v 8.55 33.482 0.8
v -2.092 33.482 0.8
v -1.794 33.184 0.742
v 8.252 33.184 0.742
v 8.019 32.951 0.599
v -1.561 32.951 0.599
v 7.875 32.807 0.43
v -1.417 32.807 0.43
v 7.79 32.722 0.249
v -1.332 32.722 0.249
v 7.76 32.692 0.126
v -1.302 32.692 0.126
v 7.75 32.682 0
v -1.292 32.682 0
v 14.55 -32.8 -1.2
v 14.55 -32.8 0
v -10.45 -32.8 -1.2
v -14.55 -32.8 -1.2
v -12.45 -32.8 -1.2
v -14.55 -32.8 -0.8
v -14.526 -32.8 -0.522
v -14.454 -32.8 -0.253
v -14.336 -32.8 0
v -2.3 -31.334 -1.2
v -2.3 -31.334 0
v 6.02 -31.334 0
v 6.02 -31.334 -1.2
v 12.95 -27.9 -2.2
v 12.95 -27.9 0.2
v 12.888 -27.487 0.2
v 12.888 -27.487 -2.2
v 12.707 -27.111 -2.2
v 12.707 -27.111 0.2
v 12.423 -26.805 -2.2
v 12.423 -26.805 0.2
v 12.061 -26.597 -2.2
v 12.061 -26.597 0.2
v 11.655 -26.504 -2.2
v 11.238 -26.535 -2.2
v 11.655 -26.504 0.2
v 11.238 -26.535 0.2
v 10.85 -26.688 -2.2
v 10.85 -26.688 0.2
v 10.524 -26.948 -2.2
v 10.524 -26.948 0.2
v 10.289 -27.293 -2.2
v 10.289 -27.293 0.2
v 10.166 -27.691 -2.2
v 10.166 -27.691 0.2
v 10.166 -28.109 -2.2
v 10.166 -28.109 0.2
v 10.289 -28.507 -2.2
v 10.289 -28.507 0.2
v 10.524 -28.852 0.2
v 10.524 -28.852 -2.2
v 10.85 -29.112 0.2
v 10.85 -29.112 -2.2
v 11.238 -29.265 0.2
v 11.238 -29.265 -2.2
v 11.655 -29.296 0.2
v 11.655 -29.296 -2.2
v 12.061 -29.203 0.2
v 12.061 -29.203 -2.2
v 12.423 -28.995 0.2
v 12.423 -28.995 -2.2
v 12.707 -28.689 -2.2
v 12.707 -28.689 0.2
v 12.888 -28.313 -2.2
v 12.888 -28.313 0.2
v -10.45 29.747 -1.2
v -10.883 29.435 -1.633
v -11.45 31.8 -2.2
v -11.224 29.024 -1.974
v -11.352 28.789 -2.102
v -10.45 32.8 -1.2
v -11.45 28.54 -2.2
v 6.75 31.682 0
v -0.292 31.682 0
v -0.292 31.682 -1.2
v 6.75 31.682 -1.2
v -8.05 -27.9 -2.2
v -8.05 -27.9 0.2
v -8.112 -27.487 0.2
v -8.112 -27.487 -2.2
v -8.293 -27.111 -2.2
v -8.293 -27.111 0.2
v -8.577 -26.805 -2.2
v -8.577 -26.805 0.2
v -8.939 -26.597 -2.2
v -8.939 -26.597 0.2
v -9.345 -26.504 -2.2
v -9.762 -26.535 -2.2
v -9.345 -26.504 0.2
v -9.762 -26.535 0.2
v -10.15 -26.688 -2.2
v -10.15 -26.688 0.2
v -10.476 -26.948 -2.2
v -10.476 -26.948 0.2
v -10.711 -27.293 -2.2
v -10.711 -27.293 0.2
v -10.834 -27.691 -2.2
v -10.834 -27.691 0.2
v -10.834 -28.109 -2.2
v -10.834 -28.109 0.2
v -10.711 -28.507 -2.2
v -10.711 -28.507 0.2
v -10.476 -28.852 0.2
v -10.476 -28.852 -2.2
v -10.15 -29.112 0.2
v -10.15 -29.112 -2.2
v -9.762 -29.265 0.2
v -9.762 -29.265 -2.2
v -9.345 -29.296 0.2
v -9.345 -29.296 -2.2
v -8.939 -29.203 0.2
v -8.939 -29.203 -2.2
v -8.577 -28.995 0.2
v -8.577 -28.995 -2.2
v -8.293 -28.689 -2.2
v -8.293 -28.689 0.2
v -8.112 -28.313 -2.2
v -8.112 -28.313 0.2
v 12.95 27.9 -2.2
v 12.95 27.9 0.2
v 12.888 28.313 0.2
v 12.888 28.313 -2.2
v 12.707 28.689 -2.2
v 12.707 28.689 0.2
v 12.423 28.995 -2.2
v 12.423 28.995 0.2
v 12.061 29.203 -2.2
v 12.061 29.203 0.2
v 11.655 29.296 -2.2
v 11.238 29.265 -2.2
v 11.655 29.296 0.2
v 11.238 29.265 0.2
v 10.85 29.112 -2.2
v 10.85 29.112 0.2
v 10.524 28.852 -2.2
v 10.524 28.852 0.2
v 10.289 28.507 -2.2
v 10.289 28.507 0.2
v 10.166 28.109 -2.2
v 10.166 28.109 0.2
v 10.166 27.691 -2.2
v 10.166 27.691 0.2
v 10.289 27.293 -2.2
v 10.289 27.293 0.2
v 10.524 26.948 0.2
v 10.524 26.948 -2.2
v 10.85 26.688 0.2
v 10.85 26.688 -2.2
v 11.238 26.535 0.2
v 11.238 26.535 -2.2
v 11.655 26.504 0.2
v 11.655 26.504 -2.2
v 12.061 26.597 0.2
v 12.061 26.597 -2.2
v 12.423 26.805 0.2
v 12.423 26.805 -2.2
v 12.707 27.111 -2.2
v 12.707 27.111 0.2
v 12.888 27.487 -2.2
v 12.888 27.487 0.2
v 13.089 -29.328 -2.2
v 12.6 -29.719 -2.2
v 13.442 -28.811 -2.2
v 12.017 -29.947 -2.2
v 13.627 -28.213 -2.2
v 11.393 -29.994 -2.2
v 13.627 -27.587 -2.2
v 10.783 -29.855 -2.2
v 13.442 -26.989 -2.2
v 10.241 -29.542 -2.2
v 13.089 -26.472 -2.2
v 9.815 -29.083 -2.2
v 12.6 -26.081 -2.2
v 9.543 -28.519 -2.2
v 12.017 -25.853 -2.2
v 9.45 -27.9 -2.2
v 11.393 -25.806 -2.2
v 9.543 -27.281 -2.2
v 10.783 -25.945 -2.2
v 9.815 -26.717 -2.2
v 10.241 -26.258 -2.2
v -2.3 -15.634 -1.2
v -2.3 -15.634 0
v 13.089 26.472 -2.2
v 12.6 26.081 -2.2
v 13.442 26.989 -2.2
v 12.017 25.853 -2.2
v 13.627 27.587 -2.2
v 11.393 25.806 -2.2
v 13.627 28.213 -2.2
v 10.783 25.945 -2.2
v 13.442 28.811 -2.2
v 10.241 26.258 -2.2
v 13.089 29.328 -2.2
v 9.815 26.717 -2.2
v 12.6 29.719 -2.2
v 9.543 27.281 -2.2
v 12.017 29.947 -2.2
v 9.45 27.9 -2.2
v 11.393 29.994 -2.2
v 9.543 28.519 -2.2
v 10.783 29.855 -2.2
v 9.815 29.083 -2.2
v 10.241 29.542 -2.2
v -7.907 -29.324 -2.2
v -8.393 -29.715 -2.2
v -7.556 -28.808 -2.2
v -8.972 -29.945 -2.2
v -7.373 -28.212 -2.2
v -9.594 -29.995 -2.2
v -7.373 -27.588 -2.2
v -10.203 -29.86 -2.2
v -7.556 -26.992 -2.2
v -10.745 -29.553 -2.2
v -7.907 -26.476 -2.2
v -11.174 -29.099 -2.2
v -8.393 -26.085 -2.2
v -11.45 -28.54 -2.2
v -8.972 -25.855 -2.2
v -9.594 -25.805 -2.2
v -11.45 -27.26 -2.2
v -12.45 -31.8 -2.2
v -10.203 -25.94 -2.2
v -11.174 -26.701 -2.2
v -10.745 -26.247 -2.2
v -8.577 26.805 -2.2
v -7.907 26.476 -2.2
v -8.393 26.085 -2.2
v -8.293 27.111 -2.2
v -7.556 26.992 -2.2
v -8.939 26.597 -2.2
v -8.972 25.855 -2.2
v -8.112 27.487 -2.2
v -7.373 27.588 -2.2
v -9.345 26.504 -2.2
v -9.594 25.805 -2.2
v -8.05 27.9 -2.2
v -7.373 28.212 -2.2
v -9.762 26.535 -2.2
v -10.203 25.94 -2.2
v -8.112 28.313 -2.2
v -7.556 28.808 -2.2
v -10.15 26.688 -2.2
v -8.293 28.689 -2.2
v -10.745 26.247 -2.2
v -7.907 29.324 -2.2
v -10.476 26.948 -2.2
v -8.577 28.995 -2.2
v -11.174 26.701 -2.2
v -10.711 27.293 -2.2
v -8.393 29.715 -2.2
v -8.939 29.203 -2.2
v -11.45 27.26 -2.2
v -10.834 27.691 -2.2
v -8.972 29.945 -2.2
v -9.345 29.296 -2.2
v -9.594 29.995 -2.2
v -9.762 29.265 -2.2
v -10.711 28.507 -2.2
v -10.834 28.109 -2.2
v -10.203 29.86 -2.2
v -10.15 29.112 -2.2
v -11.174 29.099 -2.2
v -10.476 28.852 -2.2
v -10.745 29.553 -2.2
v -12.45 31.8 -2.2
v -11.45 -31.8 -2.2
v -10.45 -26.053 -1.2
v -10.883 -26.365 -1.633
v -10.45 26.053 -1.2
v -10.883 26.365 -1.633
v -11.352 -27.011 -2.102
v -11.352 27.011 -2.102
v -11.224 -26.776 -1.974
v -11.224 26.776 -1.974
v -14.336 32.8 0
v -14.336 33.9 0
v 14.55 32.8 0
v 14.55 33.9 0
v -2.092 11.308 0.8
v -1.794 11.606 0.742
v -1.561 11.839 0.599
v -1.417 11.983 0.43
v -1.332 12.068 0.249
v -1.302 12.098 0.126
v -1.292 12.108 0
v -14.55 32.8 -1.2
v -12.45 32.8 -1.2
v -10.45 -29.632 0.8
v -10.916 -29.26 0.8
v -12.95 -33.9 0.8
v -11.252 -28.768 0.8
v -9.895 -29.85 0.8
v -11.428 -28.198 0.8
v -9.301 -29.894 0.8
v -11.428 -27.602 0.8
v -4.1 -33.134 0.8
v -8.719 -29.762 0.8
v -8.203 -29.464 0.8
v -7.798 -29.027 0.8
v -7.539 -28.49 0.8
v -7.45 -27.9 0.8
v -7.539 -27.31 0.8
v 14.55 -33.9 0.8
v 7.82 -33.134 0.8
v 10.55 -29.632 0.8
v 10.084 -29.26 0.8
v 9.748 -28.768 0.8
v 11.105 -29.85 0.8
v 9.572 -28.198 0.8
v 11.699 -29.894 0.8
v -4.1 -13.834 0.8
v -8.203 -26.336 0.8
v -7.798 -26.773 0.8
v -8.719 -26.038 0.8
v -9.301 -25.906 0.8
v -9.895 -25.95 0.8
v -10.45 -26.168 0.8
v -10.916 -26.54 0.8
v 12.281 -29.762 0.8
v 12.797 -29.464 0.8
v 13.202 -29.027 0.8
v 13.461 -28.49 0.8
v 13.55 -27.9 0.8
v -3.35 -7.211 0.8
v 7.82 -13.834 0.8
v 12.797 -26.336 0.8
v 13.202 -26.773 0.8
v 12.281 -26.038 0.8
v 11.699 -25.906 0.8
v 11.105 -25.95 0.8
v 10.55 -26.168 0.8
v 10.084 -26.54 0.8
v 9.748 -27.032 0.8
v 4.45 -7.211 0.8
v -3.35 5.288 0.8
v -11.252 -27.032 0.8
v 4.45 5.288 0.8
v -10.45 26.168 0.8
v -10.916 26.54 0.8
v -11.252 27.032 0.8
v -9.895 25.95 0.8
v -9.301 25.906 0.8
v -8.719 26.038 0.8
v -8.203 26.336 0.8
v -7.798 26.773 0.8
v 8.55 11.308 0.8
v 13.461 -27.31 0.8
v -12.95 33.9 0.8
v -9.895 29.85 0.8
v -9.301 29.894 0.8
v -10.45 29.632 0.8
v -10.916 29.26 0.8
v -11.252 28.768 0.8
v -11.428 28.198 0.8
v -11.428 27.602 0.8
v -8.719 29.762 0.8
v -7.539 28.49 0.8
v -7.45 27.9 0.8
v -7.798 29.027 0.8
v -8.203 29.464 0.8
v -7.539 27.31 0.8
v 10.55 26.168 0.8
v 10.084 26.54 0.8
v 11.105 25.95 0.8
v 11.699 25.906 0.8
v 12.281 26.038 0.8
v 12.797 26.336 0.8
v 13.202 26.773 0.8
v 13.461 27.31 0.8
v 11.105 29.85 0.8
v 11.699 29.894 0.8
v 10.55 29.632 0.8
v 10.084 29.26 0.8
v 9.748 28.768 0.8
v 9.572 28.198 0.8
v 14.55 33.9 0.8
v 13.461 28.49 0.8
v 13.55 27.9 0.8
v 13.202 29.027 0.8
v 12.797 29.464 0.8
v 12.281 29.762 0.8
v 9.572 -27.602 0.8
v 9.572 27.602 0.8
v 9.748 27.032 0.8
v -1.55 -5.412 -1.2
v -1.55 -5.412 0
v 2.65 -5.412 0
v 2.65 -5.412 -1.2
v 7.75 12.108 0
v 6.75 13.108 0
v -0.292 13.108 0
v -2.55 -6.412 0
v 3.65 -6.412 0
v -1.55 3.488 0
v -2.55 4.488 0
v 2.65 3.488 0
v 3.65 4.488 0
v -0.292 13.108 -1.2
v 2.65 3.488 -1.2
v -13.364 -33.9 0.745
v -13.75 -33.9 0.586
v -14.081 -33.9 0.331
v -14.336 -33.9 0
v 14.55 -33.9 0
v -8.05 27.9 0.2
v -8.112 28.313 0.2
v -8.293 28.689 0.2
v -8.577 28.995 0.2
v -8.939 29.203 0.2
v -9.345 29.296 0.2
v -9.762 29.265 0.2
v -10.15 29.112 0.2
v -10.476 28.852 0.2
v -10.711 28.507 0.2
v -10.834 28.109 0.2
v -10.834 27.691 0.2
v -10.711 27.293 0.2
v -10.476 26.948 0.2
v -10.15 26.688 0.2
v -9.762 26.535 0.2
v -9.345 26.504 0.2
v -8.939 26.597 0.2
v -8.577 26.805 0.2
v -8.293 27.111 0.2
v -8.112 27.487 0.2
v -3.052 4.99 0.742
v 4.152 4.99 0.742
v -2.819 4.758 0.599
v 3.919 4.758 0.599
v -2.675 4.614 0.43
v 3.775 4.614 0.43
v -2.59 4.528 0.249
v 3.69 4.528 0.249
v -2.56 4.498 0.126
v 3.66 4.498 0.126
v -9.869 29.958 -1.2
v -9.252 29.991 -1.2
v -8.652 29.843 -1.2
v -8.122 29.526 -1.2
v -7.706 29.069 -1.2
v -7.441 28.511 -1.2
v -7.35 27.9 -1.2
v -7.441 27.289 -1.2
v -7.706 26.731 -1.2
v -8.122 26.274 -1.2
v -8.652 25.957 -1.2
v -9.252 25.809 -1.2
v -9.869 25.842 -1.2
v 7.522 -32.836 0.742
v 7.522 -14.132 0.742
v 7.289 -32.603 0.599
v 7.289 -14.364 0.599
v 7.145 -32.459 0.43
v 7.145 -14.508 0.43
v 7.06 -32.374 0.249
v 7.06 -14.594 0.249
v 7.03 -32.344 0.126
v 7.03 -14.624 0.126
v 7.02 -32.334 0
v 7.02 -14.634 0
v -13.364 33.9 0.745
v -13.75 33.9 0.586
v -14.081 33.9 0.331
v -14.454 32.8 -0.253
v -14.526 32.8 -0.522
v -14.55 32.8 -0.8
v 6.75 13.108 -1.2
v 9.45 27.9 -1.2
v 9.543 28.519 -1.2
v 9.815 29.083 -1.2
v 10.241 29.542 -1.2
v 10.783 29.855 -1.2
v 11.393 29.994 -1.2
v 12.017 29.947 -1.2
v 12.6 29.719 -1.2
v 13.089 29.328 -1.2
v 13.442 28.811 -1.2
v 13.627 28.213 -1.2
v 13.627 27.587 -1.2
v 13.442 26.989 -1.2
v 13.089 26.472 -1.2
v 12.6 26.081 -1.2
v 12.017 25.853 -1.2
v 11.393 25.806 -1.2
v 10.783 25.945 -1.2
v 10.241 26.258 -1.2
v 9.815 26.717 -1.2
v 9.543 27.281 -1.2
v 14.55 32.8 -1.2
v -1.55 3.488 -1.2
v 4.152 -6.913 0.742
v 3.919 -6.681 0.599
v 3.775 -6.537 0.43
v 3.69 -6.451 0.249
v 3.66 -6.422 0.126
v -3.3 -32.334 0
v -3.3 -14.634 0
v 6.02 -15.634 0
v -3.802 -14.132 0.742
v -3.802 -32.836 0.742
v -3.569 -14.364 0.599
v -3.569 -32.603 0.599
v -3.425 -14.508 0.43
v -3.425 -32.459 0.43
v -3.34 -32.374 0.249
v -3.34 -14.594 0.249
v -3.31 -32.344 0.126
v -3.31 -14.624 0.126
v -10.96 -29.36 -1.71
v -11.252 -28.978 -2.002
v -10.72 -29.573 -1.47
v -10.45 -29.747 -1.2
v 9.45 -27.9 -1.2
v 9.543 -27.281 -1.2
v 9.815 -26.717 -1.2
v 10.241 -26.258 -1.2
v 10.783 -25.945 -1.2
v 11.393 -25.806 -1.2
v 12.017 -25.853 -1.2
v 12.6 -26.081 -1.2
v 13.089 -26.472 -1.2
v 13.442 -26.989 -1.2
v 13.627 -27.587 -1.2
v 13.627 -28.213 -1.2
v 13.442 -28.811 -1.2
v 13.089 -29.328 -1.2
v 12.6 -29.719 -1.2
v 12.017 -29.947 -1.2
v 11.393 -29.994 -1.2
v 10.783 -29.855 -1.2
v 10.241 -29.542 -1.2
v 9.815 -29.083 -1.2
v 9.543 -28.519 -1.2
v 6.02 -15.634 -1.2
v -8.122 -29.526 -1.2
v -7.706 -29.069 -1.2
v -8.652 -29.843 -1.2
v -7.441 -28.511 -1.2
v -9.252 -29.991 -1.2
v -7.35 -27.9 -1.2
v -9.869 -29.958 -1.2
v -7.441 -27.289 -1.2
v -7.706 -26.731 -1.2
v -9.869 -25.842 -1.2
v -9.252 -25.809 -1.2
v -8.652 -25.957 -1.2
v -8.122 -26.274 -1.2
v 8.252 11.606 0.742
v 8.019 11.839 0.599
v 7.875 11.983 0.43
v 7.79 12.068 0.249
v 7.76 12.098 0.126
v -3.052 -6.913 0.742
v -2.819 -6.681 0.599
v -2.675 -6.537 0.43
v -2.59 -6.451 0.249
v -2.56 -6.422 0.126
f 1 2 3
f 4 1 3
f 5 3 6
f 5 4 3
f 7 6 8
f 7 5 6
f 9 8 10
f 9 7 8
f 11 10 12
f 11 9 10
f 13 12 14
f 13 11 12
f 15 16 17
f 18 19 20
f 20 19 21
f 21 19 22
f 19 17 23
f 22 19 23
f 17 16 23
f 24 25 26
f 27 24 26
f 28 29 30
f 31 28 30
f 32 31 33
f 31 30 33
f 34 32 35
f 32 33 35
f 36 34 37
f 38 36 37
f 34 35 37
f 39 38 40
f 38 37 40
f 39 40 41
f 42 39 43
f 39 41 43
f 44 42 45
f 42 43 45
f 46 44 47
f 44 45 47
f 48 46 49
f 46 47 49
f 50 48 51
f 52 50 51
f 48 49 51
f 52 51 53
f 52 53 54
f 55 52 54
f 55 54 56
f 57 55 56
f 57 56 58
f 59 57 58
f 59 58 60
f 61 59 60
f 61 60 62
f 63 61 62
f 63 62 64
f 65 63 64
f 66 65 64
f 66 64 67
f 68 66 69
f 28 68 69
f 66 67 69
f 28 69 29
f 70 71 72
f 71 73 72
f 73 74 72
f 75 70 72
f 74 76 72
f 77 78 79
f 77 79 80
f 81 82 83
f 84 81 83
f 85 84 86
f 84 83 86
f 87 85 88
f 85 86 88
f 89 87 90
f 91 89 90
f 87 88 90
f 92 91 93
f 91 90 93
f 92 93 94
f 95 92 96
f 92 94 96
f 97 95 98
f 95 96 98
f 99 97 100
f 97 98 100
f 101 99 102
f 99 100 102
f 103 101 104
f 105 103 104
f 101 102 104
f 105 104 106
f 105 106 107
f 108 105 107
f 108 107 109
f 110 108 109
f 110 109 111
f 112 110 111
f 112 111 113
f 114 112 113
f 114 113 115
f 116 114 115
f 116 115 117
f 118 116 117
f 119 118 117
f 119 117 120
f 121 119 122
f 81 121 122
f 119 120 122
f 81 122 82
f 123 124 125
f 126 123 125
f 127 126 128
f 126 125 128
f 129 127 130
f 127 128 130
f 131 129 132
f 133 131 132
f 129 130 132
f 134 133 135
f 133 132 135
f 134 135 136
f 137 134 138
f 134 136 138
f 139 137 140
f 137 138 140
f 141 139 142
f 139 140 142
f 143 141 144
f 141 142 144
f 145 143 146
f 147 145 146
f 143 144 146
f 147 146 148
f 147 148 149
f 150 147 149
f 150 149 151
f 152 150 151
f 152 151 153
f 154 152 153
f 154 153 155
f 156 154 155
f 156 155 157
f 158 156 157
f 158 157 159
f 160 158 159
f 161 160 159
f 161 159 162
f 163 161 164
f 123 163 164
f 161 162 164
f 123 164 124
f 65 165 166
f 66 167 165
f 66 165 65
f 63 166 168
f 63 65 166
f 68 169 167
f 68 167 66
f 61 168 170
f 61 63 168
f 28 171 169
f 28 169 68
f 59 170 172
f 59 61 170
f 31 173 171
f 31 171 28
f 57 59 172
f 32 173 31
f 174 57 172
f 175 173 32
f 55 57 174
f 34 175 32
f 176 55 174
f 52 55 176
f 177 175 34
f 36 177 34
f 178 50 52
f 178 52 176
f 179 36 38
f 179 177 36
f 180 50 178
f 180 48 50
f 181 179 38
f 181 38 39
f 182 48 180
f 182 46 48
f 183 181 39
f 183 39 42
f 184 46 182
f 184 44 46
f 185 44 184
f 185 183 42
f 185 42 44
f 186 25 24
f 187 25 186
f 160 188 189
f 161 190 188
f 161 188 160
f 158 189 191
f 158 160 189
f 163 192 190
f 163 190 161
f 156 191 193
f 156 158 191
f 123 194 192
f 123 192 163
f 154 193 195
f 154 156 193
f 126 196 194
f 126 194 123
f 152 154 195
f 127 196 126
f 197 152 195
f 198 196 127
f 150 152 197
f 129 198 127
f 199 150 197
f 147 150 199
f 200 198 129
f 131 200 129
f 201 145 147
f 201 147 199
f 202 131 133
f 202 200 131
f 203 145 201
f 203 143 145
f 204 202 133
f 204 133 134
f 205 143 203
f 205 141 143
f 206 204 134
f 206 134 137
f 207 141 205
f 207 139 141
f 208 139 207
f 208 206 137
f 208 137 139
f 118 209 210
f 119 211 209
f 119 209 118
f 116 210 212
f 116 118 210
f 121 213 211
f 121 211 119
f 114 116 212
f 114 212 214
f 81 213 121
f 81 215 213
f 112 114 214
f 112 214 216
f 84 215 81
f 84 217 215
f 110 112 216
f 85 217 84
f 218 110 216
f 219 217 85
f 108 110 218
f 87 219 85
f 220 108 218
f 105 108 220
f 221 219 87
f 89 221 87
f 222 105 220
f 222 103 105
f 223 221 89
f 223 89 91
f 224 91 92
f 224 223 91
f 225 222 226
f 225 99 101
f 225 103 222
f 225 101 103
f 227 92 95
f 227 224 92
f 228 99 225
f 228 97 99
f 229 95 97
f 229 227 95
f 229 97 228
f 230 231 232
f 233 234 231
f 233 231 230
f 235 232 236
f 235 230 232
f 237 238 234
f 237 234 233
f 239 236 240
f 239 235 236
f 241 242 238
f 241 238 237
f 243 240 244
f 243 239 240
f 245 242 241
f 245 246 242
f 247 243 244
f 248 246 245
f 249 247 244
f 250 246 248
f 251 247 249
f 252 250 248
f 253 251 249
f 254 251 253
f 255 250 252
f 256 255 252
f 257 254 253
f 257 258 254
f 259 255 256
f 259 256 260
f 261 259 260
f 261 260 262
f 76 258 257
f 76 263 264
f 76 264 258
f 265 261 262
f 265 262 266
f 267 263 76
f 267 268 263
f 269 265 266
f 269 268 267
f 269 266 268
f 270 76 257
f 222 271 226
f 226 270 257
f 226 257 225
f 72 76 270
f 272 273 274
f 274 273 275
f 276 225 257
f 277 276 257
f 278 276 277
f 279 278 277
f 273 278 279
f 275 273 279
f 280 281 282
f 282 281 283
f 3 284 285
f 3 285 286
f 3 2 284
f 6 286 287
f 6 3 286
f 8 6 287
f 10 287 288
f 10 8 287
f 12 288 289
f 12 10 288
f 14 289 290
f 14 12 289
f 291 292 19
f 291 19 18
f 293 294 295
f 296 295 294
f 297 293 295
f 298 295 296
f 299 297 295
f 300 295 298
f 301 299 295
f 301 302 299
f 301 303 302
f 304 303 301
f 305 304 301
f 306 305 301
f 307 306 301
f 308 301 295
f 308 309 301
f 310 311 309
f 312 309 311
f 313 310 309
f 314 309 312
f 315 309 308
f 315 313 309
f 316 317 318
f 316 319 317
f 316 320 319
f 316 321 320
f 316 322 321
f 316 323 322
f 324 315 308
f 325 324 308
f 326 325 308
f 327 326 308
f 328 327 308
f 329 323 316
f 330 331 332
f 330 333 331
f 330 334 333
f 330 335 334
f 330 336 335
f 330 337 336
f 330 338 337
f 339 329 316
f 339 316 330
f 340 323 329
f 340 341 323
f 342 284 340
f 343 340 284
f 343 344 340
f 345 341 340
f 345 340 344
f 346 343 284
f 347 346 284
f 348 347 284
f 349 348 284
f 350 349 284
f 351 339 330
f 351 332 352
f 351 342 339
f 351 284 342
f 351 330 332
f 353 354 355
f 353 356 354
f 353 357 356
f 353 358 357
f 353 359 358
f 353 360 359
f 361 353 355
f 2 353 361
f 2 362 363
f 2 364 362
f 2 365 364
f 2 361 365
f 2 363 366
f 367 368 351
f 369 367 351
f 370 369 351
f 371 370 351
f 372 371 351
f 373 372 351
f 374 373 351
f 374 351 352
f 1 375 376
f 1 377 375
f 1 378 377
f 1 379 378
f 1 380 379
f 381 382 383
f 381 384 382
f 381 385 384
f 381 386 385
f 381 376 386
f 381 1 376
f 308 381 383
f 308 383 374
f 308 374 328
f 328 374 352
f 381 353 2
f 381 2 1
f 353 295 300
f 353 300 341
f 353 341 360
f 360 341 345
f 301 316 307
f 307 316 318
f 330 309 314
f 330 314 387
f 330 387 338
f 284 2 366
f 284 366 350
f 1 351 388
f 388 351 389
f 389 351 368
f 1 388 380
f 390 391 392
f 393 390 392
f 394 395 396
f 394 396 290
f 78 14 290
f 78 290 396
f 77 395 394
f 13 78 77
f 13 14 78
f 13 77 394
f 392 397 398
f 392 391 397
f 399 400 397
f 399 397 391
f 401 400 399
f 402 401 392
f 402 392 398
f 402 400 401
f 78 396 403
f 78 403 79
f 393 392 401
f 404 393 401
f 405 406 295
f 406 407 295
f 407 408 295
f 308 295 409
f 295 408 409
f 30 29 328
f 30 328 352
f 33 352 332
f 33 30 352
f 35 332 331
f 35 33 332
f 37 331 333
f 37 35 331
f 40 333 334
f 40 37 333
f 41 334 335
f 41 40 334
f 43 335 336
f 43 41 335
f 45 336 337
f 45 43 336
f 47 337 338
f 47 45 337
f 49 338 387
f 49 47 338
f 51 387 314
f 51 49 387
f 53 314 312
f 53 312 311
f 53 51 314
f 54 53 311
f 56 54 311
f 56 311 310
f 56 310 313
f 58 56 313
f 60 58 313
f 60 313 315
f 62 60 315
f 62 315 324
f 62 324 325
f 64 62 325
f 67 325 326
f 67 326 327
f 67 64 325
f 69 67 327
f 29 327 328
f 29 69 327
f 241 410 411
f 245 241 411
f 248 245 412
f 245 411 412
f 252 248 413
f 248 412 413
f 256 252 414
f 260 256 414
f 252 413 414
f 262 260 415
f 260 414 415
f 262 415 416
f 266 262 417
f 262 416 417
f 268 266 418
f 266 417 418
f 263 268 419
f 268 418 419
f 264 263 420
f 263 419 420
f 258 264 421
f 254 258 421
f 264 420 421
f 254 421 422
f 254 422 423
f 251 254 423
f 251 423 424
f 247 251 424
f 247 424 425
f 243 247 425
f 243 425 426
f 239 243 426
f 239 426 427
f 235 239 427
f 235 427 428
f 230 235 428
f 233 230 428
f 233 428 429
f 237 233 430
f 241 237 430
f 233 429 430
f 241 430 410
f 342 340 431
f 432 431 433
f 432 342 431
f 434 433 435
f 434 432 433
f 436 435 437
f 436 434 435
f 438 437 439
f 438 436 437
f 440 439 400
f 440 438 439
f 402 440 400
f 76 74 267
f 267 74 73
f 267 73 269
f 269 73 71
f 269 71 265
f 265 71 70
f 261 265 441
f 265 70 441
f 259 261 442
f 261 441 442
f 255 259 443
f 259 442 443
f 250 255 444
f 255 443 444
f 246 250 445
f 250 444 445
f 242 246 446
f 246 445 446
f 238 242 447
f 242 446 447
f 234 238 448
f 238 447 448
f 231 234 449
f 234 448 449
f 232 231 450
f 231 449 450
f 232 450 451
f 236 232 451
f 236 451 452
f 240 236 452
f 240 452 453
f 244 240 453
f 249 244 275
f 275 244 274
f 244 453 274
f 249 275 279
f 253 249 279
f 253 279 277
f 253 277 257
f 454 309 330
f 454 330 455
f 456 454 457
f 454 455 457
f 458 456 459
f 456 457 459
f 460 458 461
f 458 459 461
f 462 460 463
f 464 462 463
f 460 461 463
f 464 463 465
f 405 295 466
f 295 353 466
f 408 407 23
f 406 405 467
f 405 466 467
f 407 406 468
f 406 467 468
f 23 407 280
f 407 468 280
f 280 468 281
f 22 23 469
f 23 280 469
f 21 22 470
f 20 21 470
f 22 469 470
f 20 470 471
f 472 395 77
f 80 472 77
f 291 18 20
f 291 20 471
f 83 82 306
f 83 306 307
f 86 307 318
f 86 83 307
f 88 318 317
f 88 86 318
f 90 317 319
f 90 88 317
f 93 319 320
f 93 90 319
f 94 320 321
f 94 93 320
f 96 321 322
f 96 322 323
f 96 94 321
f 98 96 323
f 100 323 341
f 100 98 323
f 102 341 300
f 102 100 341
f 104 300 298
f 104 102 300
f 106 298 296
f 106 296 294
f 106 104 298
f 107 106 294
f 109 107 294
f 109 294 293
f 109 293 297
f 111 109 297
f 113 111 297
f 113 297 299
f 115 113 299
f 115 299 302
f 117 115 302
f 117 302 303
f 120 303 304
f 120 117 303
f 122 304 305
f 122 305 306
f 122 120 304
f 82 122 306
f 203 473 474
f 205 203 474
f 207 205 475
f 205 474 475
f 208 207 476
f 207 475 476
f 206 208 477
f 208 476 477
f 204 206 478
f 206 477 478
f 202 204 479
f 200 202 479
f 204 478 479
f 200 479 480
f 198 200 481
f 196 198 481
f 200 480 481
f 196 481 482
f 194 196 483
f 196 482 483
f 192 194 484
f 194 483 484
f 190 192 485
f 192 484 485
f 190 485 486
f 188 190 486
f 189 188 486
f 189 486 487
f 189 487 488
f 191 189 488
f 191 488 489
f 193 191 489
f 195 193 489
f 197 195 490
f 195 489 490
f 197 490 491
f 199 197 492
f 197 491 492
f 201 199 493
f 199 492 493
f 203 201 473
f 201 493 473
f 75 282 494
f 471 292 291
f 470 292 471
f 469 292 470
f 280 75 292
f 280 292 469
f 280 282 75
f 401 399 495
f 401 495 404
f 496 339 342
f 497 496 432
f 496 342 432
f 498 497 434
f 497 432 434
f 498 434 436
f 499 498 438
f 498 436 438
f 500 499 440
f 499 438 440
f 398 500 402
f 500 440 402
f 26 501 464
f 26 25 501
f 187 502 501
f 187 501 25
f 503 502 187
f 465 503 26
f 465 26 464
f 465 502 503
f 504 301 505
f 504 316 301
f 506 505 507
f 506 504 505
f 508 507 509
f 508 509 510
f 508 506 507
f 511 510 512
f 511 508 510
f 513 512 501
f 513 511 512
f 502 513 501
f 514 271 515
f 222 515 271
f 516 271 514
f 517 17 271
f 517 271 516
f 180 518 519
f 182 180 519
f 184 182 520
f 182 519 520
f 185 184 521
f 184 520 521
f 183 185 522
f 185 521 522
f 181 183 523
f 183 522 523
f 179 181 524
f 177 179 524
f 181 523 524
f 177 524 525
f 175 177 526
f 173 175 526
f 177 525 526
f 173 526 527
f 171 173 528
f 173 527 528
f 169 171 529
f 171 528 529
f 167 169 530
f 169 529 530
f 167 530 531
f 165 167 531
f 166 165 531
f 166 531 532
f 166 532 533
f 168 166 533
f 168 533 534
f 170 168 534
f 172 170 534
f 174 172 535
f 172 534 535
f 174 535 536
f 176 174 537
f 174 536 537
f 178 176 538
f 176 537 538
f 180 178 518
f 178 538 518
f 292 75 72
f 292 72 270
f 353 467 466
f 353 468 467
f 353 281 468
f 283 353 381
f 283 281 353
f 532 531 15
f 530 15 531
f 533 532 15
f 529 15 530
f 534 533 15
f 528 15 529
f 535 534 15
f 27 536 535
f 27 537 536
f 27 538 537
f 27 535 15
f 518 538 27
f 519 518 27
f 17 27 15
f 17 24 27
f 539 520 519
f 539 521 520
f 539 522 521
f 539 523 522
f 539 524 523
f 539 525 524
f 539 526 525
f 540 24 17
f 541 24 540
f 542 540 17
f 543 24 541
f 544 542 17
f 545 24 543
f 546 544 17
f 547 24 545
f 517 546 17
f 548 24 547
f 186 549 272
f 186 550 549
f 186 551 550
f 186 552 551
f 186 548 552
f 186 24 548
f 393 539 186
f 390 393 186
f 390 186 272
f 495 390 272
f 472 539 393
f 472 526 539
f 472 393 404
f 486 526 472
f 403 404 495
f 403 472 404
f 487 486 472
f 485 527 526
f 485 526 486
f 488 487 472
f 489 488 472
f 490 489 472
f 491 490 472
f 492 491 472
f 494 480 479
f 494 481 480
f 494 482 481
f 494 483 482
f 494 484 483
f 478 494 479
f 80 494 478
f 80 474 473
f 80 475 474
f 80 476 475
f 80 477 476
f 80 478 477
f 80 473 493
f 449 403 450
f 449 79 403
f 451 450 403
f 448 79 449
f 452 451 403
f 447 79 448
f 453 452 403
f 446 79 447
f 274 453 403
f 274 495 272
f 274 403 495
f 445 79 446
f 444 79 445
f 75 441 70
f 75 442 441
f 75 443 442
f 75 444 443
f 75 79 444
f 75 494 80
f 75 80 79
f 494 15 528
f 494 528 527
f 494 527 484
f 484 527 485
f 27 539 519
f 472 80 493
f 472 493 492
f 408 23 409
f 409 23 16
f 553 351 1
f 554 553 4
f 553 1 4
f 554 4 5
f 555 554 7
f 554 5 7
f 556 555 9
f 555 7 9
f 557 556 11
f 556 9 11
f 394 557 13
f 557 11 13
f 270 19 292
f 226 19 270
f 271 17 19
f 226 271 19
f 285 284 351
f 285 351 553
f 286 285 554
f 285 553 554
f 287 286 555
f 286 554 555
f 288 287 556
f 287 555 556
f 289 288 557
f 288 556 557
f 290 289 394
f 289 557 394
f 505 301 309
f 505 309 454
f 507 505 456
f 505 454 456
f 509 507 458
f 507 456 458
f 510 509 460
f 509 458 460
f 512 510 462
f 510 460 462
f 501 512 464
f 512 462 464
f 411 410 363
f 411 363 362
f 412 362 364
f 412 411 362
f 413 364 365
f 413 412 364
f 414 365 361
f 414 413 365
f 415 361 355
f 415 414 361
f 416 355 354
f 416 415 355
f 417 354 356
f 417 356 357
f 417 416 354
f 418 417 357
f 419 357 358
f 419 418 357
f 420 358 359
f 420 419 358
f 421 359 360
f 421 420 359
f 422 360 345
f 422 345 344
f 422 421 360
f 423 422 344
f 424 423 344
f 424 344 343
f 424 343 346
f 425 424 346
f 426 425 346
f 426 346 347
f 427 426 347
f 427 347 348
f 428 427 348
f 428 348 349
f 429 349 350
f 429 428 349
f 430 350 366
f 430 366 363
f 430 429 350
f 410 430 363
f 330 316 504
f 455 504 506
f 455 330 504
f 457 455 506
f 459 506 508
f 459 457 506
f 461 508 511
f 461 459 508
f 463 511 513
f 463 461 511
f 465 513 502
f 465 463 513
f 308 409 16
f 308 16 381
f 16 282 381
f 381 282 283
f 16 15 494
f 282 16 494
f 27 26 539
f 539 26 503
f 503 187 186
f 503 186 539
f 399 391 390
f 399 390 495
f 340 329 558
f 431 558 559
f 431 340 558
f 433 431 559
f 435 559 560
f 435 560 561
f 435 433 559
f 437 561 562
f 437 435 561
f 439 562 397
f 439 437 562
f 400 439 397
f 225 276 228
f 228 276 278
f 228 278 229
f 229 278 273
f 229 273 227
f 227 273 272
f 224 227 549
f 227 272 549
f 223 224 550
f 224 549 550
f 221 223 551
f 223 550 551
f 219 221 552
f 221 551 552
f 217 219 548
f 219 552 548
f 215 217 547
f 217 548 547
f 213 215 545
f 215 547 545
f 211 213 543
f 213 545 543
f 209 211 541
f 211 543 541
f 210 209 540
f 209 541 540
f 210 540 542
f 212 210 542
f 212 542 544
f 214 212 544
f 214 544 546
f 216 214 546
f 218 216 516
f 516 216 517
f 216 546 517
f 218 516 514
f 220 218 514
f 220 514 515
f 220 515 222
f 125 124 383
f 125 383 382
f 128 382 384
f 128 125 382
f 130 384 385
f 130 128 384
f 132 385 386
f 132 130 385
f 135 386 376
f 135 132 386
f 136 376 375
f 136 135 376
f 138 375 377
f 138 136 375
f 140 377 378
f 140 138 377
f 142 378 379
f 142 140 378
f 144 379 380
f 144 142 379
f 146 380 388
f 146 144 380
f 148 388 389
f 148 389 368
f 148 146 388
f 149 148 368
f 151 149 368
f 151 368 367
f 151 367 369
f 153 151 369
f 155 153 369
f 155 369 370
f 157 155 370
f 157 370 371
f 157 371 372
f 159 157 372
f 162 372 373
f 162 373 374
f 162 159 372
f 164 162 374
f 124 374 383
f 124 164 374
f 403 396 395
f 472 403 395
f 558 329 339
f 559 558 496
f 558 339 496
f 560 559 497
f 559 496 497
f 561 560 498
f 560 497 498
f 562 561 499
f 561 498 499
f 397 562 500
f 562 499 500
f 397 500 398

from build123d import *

# Parameters (mm, degrees)
SKETCH_2_W          = 29.1
SKETCH_2_H          = 67.8
EXTRUDE_1_DEPTH     = 0.8
SKETCH_3_W          = 29.1
SKETCH_3_H          = 65.6
EXTRUDE_2_DEPTH     = 1.2
SKETCH_4_R          = 1.4
SKETCH_4_W          = 7.042
SKETCH_4_H          = 18.5736
SKETCH_4_W_2        = 4.2
SKETCH_4_H_2        = 8.9
SKETCH_4_W_3        = 8.32
SKETCH_4_H_3        = 15.7
CUT_EXTRUDE_1_DEPTH = 37.944722221
SKETCH_5_R          = 2.1
SKETCH_5_R_2        = 1.1
SKETCH_5_R_3        = 1
EXTRUDE_3_DEPTH     = 1
SKETCH_6_W          = 1
SKETCH_6_H          = 65.6
EXTRUDE_4_DEPTH     = 1
CHAMFER_1_SIZE      = 1
CHAMFER_3_SIZE      = 1
SKETCH_7_W          = 9.042
SKETCH_7_H          = 20.5736
SKETCH_7_W_2        = 6.2
SKETCH_7_H_2        = 10.9
SKETCH_7_W_3        = 10.32
SKETCH_7_H_3        = 17.7
CUT_EXTRUDE_2_DEPTH = 0.8
FILLET_3_R          = 0.8
FILLET_4_R          = 0.8
FILLET_5_R          = 0.8
SKETCH_8_R          = 1.4
CUT_EXTRUDE_3_DEPTH = 37.944722221
CHAMFER_4_SIZE      = 0.6
FILLET_6_R          = 1.6


with BuildPart() as part:
    # Эскиз2 → Бобышка-Вытянуть1 (new body)
    with BuildSketch(Plane.XY):
        Rectangle(SKETCH_2_W, SKETCH_2_H)
    extrude(amount=EXTRUDE_1_DEPTH)

    # Эскиз3 → Бобышка-Вытянуть2 (add)
    with BuildSketch(Plane(origin=(0, 0, 0), x_dir=(-1, 0, 0), z_dir=(0, 0, -1))):
        Rectangle(SKETCH_3_W, SKETCH_3_H)
    extrude(amount=EXTRUDE_2_DEPTH)

    # Эскиз4 → Вырез-Вытянуть1 (cut, through all)
    with BuildSketch(Plane.XY.offset(0.8)):
        with Locations((-9.45, -27.9)):
            Circle(SKETCH_4_R)
        with Locations((11.55, -27.9)):
            Circle(SKETCH_4_R)
        with Locations((11.55, 27.9)):
            Circle(SKETCH_4_R)
        with Locations((-9.45, 27.9)):
            Circle(SKETCH_4_R)
        with Locations((3.229, 22.395)):
            Rectangle(SKETCH_4_W, SKETCH_4_H)
        with Locations((0.55, -0.961534596)):
            Rectangle(SKETCH_4_W_2, SKETCH_4_H_2)
        with Locations((1.86, -23.483733333)):
            Rectangle(SKETCH_4_W_3, SKETCH_4_H_3)
    extrude(amount=-CUT_EXTRUDE_1_DEPTH, mode=Mode.SUBTRACT)

    # Эскиз5 → Бобышка-Вытянуть3 (add)
    # profile 1 of 4: a face of its own
    with BuildSketch(Plane(origin=(0, 0, -1.2), x_dir=(-1, 0, 0), z_dir=(0, 0, -1))):
        with Locations((-11.55, 27.9)):
            Circle(SKETCH_5_R)
        with Locations((-11.55, 27.9)):
            Circle(SKETCH_5_R_2, mode=Mode.SUBTRACT)
    # profile 2 of 4: a face of its own
    with BuildSketch(Plane(origin=(0, 0, -1.2), x_dir=(-1, 0, 0), z_dir=(0, 0, -1))):
        with Locations((-11.55, -27.9)):
            Circle(SKETCH_5_R)
        with Locations((-11.55, -27.9)):
            Circle(SKETCH_5_R_2, mode=Mode.SUBTRACT)
    # profile 3 of 4: a face of its own
    with BuildSketch(Plane(origin=(0, 0, -1.2), x_dir=(-1, 0, 0), z_dir=(0, 0, -1))):
        with Locations((9.45, 27.9)):
            Circle(SKETCH_5_R)
        with Locations((9.45, 27.9)):
            Circle(SKETCH_5_R_3, mode=Mode.SUBTRACT)
    # profile 4 of 4: a face of its own
    with BuildSketch(Plane(origin=(0, 0, -1.2), x_dir=(-1, 0, 0), z_dir=(0, 0, -1))):
        with Locations((9.45, -27.9)):
            Circle(SKETCH_5_R)
        with Locations((9.45, -27.9)):
            Circle(SKETCH_5_R_3, mode=Mode.SUBTRACT)
    extrude(amount=EXTRUDE_3_DEPTH)

    # Эскиз6 → Бобышка-Вытянуть4 (add)
    with BuildSketch(Plane(origin=(0, 0, -1.2), x_dir=(-1, 0, 0), z_dir=(0, 0, -1))):
        with Locations((11.95, 0)):
            Rectangle(SKETCH_6_W, SKETCH_6_H)
    extrude(amount=EXTRUDE_4_DEPTH)

    # Фаска1
    chamfer_1_edges = [part.edges().sort_by_distance(p)[0] for p in [
        (-11.95, -32.8, -2.2),
        (-11.95, 32.8, -2.2),
    ]]
    chamfer(chamfer_1_edges, length=CHAMFER_1_SIZE)

    # Фаска3
    chamfer_3_edges = [part.edges().sort_by_distance(p)[0] for p in [
        (-11.45, -30.670156212, -1.2),
        (-11.45, 30.670156212, -1.2),
        (-11.45, 0, -1.2),
    ]]
    chamfer(chamfer_3_edges, length=CHAMFER_3_SIZE - 0.0001)  # a hair under: the kernel refuses the full size

    # Эскиз7 → Вырез-Вытянуть2 (cut)
    with BuildSketch(Plane.XY.offset(0.8)):
        with Locations((3.229, 22.395)):
            Rectangle(SKETCH_7_W, SKETCH_7_H)
        with Locations((0.55, -0.961534596)):
            Rectangle(SKETCH_7_W_2, SKETCH_7_H_2)
        with Locations((1.86, -23.483733333)):
            Rectangle(SKETCH_7_W_3, SKETCH_7_H_3)
    extrude(amount=-CUT_EXTRUDE_2_DEPTH, mode=Mode.SUBTRACT)

    # Скругление3
    fillet_3_edges = [part.edges().sort_by_distance(p)[0] for p in [
        (3.229, 12.1082, 0.8),
        (7.75, 22.395, 0.8),
        (3.229, 32.6818, 0.8),
        (-1.292, 22.395, 0.8),
    ]]
    fillet(fillet_3_edges, radius=FILLET_3_R - 0.0001)  # a hair under: the kernel refuses the full size

    # Скругление4
    fillet_4_edges = [part.edges().sort_by_distance(p)[0] for p in [
        (0.55, -6.411534596, 0.8),
        (-2.55, -0.961534596, 0.8),
        (0.55, 4.488465404, 0.8),
        (3.65, -0.961534596, 0.8),
    ]]
    fillet(fillet_4_edges, radius=FILLET_4_R - 0.0001)  # a hair under: the kernel refuses the full size

    # Скругление5
    fillet_5_edges = [part.edges().sort_by_distance(p)[0] for p in [
        (1.86, -32.333733333, 0.8),
        (-3.3, -23.483733333, 0.8),
        (1.86, -14.633733333, 0.8),
        (7.02, -23.483733333, 0.8),
    ]]
    fillet(fillet_5_edges, radius=FILLET_5_R - 0.0001)  # a hair under: the kernel refuses the full size

    # Эскиз8 → Вырез-Вытянуть3 (cut, through all)
    with BuildSketch(Plane.XY.offset(-1.2)):
        with Locations((11.55, 27.9)):
            Circle(SKETCH_8_R)
        with Locations((-9.45, -27.9)):
            Circle(SKETCH_8_R)
        with Locations((11.55, -27.9)):
            Circle(SKETCH_8_R)
        with Locations((-9.45, 27.9)):
            Circle(SKETCH_8_R)
    extrude(amount=-CUT_EXTRUDE_3_DEPTH, mode=Mode.SUBTRACT)

    # Фаска4
    chamfer_4_edges = [part.edges().sort_by_distance(p)[0] for p in [
        (10.15, -27.9, 0.8),
        (10.15, 27.9, 0.8),
        (-10.85, 27.9, 0.8),
        (-10.85, -27.9, 0.8),
    ]]
    chamfer(chamfer_4_edges, length=CHAMFER_4_SIZE)

    # Скругление6
    fillet_6_edges = [part.edges().sort_by_distance(p)[0] for p in [
        (-14.55, 0, 0.8),
    ]]
    fillet(fillet_6_edges, radius=FILLET_6_R)


solid = part.part
